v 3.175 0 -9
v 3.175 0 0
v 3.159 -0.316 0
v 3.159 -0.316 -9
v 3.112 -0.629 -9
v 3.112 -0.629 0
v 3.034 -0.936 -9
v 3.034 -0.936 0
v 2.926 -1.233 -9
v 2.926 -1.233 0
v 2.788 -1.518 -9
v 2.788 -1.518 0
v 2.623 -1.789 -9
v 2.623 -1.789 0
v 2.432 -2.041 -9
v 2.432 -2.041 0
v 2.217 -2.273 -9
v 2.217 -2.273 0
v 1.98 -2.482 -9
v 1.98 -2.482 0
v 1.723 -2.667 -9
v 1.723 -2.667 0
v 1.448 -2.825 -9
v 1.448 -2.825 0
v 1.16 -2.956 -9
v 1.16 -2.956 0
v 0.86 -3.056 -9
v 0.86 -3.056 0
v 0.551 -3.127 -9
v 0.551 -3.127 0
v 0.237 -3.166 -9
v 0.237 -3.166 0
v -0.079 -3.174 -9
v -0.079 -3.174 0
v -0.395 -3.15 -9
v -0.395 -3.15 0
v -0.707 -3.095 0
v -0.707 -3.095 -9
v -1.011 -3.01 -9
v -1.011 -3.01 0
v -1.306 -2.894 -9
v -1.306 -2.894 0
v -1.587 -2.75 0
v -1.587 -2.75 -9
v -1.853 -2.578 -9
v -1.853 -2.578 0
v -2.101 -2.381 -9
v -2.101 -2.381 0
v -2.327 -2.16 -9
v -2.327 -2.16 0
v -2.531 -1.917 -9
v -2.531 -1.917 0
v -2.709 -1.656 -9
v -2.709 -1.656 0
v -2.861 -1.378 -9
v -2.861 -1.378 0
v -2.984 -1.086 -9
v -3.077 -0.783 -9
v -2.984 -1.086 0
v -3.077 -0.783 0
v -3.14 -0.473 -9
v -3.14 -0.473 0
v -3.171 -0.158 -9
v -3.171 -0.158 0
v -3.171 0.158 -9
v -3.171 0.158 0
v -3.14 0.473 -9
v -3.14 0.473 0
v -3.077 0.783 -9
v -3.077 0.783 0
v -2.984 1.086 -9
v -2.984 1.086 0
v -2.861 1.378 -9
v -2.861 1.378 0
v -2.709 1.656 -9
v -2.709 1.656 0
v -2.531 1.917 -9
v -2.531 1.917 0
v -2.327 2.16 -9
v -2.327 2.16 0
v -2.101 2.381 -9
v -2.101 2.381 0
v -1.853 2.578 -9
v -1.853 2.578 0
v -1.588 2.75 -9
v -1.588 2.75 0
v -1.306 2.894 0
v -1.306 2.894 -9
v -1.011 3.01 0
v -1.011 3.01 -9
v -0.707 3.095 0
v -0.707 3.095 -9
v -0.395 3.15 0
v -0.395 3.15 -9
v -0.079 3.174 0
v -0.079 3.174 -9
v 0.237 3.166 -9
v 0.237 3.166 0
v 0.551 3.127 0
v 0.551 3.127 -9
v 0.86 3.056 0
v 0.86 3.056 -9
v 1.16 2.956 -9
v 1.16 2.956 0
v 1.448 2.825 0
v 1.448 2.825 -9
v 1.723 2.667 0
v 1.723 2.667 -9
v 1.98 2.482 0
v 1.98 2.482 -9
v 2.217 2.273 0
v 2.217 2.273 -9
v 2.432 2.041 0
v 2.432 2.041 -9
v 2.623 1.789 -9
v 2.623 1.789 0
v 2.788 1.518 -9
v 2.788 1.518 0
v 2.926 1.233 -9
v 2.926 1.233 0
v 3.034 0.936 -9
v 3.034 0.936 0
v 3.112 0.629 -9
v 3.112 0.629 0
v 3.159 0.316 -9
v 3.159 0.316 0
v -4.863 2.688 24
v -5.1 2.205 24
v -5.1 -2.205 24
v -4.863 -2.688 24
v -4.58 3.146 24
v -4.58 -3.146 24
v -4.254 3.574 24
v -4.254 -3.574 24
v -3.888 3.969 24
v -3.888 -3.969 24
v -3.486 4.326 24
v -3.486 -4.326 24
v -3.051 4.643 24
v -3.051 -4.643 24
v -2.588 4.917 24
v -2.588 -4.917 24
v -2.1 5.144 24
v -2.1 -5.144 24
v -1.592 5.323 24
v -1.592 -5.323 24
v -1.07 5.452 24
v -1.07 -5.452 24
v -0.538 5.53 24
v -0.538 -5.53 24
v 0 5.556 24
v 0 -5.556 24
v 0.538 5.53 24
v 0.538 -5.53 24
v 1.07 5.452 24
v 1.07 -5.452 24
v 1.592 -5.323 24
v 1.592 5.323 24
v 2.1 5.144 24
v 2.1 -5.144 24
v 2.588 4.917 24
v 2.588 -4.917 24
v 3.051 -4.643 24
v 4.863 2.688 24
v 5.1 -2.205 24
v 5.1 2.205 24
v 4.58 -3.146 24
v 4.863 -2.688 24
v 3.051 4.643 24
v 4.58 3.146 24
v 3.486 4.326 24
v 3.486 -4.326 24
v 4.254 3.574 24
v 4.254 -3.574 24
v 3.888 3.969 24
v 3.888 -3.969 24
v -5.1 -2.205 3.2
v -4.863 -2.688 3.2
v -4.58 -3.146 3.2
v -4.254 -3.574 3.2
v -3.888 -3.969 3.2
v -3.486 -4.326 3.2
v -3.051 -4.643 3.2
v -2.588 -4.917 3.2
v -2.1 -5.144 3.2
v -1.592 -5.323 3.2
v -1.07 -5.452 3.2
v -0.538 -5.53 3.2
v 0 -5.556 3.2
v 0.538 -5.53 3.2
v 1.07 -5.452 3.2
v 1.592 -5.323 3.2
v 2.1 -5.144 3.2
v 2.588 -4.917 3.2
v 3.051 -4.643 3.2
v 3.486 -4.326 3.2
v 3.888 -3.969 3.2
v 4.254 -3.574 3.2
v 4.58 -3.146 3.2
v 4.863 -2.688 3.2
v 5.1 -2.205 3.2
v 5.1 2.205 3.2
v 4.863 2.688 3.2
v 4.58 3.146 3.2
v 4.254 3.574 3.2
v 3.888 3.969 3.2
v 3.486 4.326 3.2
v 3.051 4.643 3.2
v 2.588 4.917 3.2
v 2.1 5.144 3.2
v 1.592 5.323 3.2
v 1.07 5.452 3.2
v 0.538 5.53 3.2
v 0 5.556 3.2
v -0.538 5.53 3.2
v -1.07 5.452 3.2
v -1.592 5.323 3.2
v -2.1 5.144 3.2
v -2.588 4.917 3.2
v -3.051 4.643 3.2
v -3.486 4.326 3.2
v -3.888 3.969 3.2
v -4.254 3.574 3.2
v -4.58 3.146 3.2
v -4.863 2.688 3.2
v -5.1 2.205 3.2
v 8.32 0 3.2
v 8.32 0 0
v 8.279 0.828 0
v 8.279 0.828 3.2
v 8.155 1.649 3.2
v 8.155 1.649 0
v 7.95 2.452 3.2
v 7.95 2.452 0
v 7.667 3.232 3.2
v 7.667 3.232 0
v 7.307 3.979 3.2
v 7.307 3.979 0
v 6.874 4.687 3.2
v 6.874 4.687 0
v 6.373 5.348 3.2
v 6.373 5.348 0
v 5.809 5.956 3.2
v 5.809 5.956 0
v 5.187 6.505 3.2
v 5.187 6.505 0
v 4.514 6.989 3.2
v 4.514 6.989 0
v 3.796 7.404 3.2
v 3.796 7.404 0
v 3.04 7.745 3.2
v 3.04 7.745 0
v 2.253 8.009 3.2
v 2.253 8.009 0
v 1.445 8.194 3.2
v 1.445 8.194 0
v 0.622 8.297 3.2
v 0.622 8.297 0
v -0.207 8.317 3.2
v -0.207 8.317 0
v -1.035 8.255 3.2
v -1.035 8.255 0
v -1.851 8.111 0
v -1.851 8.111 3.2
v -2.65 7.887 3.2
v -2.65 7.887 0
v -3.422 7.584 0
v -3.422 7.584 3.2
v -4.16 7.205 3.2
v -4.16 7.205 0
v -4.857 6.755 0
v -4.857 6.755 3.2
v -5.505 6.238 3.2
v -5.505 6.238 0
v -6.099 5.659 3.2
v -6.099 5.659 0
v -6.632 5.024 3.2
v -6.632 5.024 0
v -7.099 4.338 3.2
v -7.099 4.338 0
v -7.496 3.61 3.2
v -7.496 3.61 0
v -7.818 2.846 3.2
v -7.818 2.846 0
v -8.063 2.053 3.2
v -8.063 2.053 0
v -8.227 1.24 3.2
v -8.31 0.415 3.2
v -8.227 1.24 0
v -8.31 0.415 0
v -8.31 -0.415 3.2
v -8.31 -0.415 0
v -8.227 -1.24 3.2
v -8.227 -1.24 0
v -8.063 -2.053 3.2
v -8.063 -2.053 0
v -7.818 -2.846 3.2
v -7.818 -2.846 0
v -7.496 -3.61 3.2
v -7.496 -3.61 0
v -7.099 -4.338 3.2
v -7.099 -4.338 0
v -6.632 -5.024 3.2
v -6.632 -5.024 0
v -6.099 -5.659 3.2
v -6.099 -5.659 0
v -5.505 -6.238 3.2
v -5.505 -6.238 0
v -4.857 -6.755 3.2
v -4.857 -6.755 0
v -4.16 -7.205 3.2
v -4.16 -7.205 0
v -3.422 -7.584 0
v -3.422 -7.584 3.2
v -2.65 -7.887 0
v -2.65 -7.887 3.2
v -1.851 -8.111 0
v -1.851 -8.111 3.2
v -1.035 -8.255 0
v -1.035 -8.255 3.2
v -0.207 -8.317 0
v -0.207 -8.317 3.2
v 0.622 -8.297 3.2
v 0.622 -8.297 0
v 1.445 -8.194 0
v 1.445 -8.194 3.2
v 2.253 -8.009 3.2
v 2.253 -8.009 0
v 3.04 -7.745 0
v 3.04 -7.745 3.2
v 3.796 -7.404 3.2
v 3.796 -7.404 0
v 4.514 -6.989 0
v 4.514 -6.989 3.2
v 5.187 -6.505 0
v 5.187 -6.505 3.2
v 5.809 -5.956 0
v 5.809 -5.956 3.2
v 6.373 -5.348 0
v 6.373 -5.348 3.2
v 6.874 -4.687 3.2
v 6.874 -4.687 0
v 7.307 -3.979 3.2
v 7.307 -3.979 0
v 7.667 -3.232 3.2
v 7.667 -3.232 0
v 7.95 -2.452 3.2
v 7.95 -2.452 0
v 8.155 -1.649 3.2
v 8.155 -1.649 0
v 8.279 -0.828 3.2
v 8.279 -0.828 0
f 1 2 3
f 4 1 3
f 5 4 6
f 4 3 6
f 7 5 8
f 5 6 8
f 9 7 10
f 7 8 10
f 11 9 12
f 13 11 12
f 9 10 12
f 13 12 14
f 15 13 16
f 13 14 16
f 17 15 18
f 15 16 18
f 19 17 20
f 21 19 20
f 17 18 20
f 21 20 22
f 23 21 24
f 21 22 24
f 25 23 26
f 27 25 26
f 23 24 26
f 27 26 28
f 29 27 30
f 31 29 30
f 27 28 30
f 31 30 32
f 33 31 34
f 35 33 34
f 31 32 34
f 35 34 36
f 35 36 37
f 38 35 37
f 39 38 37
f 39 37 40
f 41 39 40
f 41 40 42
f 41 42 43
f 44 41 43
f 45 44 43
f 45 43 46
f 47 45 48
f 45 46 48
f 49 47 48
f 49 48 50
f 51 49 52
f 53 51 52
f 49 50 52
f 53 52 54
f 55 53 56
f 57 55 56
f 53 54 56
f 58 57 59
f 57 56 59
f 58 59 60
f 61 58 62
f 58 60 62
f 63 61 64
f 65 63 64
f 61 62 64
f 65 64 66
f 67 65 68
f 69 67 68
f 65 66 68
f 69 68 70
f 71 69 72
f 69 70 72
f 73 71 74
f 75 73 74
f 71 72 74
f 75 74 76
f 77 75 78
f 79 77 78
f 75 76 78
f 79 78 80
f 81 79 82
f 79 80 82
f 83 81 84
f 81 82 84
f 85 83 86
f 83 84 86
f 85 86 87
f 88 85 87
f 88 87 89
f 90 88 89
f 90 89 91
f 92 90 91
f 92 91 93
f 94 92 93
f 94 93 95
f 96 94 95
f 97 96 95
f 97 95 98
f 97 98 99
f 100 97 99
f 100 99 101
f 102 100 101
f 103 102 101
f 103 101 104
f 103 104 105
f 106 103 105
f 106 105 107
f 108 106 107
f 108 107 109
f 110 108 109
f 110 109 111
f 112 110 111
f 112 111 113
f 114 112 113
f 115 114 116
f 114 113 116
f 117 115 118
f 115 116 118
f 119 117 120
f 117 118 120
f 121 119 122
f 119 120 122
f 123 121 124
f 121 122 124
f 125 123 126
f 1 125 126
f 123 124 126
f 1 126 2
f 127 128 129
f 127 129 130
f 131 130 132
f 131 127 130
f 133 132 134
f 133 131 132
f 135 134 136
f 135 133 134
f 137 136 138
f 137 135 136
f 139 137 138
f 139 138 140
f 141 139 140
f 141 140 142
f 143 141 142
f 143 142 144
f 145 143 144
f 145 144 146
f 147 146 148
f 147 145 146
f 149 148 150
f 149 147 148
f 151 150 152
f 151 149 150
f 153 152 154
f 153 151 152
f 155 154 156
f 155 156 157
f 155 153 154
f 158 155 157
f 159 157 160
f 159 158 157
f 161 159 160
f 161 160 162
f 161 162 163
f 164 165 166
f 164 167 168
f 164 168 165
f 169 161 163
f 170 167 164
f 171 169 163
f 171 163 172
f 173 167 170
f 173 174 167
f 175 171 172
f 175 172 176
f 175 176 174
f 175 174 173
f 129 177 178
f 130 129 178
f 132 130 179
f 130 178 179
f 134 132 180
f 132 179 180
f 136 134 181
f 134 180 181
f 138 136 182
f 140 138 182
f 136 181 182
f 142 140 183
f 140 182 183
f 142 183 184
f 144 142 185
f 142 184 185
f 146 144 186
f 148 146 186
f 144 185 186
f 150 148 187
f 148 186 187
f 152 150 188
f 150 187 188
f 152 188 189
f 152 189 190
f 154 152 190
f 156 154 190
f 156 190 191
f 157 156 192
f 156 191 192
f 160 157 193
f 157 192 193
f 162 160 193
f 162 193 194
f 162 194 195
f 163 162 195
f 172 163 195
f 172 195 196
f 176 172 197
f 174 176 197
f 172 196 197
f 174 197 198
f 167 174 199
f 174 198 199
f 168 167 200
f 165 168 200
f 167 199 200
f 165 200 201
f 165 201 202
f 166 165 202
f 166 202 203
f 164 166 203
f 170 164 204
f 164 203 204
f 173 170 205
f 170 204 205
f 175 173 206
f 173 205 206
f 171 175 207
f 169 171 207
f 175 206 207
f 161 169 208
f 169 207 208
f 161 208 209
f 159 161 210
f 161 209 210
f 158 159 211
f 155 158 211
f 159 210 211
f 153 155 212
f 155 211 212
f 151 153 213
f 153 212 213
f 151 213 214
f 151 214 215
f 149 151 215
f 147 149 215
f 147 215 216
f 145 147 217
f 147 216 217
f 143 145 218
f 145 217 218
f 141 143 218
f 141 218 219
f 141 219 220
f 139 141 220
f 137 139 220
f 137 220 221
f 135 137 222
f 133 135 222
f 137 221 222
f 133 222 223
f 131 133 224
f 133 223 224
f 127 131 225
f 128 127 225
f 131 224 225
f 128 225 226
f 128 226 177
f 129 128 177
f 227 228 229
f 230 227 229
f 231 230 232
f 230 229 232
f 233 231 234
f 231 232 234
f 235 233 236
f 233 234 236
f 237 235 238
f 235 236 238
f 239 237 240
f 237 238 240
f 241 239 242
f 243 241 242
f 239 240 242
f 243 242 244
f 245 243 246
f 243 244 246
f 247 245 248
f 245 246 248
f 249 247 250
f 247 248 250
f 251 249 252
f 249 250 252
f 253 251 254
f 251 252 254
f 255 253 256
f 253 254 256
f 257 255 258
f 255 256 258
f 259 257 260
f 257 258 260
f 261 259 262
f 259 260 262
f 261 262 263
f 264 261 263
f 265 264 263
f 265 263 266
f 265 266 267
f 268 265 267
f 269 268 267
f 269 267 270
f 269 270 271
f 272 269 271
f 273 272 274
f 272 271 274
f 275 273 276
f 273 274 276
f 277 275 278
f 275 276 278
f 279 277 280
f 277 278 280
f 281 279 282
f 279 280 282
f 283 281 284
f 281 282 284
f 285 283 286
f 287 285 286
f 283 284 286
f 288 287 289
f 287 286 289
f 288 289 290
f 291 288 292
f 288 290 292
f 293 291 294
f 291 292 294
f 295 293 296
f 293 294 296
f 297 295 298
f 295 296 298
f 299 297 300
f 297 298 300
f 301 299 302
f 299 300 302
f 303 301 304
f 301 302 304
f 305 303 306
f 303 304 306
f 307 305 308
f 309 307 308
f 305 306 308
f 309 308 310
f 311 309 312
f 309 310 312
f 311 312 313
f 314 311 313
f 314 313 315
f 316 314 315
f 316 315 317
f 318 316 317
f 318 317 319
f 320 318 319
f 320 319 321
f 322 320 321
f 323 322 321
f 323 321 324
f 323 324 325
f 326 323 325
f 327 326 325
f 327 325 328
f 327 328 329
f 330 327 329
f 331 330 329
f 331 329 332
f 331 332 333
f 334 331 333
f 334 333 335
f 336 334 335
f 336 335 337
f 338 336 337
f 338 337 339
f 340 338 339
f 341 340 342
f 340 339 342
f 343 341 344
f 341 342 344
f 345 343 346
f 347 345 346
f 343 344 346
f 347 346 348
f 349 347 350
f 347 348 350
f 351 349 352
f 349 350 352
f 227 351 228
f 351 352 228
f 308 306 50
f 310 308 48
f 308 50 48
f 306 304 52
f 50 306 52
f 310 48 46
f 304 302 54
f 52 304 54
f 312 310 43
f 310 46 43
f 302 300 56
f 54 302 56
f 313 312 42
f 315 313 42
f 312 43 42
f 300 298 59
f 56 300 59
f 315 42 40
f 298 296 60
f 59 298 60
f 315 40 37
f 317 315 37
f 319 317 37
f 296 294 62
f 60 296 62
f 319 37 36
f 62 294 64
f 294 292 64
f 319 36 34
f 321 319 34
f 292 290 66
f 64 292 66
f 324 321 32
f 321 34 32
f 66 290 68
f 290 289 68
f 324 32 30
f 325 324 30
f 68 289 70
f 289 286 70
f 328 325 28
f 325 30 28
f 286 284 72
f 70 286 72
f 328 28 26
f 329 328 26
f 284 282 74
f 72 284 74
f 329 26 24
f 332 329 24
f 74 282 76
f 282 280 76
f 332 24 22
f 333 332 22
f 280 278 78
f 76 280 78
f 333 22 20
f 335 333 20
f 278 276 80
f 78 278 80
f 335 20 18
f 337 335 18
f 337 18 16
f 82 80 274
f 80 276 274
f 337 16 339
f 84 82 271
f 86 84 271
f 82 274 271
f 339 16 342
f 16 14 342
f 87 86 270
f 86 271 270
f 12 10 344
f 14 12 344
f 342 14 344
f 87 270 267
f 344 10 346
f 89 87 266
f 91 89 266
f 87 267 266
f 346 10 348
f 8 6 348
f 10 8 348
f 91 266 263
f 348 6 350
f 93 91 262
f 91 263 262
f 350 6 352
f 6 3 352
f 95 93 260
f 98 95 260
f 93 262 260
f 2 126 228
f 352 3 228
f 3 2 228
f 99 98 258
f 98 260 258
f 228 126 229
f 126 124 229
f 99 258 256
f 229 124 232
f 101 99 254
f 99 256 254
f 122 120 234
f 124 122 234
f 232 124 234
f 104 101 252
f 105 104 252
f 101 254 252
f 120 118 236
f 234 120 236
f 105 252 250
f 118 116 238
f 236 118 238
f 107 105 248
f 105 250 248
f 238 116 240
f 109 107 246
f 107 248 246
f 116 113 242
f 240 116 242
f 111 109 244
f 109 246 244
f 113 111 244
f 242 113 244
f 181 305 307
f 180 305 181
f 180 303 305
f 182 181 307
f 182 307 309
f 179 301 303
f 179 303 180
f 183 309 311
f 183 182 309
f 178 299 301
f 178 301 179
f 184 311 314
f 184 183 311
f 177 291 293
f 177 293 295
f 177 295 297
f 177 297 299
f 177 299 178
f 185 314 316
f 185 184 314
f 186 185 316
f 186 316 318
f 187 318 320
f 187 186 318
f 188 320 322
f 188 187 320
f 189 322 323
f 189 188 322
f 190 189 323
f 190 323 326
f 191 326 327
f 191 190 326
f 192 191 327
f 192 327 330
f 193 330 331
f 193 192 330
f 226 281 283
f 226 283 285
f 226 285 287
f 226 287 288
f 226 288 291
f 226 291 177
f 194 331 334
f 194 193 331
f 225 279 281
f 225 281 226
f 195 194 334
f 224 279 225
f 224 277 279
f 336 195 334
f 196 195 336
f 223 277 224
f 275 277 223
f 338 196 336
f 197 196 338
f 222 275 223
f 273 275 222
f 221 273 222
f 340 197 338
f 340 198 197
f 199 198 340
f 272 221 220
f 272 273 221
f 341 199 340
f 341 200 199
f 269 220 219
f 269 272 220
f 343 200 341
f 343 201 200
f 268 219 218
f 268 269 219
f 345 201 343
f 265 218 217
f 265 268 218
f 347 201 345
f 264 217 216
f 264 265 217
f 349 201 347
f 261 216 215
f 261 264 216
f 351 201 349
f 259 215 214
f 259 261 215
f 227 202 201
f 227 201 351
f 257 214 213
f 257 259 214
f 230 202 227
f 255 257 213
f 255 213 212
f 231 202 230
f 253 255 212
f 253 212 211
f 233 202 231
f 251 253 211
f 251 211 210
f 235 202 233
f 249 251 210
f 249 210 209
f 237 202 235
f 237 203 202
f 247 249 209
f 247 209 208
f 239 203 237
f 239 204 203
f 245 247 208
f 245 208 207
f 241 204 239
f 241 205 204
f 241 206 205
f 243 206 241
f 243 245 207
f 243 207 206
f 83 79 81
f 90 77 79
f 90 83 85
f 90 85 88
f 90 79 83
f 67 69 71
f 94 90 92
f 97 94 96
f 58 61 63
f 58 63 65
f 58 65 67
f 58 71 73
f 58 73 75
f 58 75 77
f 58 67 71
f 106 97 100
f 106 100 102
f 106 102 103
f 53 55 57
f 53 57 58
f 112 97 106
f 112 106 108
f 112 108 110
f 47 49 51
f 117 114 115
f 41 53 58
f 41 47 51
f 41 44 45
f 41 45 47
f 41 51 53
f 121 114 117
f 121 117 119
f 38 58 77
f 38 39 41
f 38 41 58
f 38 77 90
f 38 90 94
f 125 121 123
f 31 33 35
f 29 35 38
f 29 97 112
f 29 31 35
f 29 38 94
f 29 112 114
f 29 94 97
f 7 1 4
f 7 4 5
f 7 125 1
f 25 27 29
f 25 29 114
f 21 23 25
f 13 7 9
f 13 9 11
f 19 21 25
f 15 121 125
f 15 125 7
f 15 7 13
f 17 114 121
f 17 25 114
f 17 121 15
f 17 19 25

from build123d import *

# Parameters (mm, degrees)
F0_R     = 8.32
F1_DEPTH = 3.2
F3_DEPTH = 20.8
F4_R     = 3.175
F5_DEPTH = 9


with BuildPart() as f1:
    # F0 (on Top) → F1 (new body)
    with BuildSketch(Plane.XY):
        Circle(F0_R)
    extrude(amount=F1_DEPTH)

    # F2 (on face) → F3 (join)
    with BuildSketch(Plane.XY.offset(3.2)):
        with BuildLine():
            Line((5.1, -2.204975), (5.1, 2.204975))
            ThreePointArc((5.1, 2.204975), (0, 5.55625), (-5.1, 2.204975))
            Line((-5.1, 2.204975), (-5.1, -2.204975))
            ThreePointArc((-5.1, -2.204975), (0, -5.55625), (5.1, -2.204975))
        make_face()
    extrude(amount=F3_DEPTH)

    # F4 (on face) → F5 (join)
    with BuildSketch(Plane(origin=(0, 0, 0), x_dir=(1, 0, 0), z_dir=(0, 0, -1))):
        Circle(F4_R)
    extrude(amount=F5_DEPTH)


solid = f1.part
